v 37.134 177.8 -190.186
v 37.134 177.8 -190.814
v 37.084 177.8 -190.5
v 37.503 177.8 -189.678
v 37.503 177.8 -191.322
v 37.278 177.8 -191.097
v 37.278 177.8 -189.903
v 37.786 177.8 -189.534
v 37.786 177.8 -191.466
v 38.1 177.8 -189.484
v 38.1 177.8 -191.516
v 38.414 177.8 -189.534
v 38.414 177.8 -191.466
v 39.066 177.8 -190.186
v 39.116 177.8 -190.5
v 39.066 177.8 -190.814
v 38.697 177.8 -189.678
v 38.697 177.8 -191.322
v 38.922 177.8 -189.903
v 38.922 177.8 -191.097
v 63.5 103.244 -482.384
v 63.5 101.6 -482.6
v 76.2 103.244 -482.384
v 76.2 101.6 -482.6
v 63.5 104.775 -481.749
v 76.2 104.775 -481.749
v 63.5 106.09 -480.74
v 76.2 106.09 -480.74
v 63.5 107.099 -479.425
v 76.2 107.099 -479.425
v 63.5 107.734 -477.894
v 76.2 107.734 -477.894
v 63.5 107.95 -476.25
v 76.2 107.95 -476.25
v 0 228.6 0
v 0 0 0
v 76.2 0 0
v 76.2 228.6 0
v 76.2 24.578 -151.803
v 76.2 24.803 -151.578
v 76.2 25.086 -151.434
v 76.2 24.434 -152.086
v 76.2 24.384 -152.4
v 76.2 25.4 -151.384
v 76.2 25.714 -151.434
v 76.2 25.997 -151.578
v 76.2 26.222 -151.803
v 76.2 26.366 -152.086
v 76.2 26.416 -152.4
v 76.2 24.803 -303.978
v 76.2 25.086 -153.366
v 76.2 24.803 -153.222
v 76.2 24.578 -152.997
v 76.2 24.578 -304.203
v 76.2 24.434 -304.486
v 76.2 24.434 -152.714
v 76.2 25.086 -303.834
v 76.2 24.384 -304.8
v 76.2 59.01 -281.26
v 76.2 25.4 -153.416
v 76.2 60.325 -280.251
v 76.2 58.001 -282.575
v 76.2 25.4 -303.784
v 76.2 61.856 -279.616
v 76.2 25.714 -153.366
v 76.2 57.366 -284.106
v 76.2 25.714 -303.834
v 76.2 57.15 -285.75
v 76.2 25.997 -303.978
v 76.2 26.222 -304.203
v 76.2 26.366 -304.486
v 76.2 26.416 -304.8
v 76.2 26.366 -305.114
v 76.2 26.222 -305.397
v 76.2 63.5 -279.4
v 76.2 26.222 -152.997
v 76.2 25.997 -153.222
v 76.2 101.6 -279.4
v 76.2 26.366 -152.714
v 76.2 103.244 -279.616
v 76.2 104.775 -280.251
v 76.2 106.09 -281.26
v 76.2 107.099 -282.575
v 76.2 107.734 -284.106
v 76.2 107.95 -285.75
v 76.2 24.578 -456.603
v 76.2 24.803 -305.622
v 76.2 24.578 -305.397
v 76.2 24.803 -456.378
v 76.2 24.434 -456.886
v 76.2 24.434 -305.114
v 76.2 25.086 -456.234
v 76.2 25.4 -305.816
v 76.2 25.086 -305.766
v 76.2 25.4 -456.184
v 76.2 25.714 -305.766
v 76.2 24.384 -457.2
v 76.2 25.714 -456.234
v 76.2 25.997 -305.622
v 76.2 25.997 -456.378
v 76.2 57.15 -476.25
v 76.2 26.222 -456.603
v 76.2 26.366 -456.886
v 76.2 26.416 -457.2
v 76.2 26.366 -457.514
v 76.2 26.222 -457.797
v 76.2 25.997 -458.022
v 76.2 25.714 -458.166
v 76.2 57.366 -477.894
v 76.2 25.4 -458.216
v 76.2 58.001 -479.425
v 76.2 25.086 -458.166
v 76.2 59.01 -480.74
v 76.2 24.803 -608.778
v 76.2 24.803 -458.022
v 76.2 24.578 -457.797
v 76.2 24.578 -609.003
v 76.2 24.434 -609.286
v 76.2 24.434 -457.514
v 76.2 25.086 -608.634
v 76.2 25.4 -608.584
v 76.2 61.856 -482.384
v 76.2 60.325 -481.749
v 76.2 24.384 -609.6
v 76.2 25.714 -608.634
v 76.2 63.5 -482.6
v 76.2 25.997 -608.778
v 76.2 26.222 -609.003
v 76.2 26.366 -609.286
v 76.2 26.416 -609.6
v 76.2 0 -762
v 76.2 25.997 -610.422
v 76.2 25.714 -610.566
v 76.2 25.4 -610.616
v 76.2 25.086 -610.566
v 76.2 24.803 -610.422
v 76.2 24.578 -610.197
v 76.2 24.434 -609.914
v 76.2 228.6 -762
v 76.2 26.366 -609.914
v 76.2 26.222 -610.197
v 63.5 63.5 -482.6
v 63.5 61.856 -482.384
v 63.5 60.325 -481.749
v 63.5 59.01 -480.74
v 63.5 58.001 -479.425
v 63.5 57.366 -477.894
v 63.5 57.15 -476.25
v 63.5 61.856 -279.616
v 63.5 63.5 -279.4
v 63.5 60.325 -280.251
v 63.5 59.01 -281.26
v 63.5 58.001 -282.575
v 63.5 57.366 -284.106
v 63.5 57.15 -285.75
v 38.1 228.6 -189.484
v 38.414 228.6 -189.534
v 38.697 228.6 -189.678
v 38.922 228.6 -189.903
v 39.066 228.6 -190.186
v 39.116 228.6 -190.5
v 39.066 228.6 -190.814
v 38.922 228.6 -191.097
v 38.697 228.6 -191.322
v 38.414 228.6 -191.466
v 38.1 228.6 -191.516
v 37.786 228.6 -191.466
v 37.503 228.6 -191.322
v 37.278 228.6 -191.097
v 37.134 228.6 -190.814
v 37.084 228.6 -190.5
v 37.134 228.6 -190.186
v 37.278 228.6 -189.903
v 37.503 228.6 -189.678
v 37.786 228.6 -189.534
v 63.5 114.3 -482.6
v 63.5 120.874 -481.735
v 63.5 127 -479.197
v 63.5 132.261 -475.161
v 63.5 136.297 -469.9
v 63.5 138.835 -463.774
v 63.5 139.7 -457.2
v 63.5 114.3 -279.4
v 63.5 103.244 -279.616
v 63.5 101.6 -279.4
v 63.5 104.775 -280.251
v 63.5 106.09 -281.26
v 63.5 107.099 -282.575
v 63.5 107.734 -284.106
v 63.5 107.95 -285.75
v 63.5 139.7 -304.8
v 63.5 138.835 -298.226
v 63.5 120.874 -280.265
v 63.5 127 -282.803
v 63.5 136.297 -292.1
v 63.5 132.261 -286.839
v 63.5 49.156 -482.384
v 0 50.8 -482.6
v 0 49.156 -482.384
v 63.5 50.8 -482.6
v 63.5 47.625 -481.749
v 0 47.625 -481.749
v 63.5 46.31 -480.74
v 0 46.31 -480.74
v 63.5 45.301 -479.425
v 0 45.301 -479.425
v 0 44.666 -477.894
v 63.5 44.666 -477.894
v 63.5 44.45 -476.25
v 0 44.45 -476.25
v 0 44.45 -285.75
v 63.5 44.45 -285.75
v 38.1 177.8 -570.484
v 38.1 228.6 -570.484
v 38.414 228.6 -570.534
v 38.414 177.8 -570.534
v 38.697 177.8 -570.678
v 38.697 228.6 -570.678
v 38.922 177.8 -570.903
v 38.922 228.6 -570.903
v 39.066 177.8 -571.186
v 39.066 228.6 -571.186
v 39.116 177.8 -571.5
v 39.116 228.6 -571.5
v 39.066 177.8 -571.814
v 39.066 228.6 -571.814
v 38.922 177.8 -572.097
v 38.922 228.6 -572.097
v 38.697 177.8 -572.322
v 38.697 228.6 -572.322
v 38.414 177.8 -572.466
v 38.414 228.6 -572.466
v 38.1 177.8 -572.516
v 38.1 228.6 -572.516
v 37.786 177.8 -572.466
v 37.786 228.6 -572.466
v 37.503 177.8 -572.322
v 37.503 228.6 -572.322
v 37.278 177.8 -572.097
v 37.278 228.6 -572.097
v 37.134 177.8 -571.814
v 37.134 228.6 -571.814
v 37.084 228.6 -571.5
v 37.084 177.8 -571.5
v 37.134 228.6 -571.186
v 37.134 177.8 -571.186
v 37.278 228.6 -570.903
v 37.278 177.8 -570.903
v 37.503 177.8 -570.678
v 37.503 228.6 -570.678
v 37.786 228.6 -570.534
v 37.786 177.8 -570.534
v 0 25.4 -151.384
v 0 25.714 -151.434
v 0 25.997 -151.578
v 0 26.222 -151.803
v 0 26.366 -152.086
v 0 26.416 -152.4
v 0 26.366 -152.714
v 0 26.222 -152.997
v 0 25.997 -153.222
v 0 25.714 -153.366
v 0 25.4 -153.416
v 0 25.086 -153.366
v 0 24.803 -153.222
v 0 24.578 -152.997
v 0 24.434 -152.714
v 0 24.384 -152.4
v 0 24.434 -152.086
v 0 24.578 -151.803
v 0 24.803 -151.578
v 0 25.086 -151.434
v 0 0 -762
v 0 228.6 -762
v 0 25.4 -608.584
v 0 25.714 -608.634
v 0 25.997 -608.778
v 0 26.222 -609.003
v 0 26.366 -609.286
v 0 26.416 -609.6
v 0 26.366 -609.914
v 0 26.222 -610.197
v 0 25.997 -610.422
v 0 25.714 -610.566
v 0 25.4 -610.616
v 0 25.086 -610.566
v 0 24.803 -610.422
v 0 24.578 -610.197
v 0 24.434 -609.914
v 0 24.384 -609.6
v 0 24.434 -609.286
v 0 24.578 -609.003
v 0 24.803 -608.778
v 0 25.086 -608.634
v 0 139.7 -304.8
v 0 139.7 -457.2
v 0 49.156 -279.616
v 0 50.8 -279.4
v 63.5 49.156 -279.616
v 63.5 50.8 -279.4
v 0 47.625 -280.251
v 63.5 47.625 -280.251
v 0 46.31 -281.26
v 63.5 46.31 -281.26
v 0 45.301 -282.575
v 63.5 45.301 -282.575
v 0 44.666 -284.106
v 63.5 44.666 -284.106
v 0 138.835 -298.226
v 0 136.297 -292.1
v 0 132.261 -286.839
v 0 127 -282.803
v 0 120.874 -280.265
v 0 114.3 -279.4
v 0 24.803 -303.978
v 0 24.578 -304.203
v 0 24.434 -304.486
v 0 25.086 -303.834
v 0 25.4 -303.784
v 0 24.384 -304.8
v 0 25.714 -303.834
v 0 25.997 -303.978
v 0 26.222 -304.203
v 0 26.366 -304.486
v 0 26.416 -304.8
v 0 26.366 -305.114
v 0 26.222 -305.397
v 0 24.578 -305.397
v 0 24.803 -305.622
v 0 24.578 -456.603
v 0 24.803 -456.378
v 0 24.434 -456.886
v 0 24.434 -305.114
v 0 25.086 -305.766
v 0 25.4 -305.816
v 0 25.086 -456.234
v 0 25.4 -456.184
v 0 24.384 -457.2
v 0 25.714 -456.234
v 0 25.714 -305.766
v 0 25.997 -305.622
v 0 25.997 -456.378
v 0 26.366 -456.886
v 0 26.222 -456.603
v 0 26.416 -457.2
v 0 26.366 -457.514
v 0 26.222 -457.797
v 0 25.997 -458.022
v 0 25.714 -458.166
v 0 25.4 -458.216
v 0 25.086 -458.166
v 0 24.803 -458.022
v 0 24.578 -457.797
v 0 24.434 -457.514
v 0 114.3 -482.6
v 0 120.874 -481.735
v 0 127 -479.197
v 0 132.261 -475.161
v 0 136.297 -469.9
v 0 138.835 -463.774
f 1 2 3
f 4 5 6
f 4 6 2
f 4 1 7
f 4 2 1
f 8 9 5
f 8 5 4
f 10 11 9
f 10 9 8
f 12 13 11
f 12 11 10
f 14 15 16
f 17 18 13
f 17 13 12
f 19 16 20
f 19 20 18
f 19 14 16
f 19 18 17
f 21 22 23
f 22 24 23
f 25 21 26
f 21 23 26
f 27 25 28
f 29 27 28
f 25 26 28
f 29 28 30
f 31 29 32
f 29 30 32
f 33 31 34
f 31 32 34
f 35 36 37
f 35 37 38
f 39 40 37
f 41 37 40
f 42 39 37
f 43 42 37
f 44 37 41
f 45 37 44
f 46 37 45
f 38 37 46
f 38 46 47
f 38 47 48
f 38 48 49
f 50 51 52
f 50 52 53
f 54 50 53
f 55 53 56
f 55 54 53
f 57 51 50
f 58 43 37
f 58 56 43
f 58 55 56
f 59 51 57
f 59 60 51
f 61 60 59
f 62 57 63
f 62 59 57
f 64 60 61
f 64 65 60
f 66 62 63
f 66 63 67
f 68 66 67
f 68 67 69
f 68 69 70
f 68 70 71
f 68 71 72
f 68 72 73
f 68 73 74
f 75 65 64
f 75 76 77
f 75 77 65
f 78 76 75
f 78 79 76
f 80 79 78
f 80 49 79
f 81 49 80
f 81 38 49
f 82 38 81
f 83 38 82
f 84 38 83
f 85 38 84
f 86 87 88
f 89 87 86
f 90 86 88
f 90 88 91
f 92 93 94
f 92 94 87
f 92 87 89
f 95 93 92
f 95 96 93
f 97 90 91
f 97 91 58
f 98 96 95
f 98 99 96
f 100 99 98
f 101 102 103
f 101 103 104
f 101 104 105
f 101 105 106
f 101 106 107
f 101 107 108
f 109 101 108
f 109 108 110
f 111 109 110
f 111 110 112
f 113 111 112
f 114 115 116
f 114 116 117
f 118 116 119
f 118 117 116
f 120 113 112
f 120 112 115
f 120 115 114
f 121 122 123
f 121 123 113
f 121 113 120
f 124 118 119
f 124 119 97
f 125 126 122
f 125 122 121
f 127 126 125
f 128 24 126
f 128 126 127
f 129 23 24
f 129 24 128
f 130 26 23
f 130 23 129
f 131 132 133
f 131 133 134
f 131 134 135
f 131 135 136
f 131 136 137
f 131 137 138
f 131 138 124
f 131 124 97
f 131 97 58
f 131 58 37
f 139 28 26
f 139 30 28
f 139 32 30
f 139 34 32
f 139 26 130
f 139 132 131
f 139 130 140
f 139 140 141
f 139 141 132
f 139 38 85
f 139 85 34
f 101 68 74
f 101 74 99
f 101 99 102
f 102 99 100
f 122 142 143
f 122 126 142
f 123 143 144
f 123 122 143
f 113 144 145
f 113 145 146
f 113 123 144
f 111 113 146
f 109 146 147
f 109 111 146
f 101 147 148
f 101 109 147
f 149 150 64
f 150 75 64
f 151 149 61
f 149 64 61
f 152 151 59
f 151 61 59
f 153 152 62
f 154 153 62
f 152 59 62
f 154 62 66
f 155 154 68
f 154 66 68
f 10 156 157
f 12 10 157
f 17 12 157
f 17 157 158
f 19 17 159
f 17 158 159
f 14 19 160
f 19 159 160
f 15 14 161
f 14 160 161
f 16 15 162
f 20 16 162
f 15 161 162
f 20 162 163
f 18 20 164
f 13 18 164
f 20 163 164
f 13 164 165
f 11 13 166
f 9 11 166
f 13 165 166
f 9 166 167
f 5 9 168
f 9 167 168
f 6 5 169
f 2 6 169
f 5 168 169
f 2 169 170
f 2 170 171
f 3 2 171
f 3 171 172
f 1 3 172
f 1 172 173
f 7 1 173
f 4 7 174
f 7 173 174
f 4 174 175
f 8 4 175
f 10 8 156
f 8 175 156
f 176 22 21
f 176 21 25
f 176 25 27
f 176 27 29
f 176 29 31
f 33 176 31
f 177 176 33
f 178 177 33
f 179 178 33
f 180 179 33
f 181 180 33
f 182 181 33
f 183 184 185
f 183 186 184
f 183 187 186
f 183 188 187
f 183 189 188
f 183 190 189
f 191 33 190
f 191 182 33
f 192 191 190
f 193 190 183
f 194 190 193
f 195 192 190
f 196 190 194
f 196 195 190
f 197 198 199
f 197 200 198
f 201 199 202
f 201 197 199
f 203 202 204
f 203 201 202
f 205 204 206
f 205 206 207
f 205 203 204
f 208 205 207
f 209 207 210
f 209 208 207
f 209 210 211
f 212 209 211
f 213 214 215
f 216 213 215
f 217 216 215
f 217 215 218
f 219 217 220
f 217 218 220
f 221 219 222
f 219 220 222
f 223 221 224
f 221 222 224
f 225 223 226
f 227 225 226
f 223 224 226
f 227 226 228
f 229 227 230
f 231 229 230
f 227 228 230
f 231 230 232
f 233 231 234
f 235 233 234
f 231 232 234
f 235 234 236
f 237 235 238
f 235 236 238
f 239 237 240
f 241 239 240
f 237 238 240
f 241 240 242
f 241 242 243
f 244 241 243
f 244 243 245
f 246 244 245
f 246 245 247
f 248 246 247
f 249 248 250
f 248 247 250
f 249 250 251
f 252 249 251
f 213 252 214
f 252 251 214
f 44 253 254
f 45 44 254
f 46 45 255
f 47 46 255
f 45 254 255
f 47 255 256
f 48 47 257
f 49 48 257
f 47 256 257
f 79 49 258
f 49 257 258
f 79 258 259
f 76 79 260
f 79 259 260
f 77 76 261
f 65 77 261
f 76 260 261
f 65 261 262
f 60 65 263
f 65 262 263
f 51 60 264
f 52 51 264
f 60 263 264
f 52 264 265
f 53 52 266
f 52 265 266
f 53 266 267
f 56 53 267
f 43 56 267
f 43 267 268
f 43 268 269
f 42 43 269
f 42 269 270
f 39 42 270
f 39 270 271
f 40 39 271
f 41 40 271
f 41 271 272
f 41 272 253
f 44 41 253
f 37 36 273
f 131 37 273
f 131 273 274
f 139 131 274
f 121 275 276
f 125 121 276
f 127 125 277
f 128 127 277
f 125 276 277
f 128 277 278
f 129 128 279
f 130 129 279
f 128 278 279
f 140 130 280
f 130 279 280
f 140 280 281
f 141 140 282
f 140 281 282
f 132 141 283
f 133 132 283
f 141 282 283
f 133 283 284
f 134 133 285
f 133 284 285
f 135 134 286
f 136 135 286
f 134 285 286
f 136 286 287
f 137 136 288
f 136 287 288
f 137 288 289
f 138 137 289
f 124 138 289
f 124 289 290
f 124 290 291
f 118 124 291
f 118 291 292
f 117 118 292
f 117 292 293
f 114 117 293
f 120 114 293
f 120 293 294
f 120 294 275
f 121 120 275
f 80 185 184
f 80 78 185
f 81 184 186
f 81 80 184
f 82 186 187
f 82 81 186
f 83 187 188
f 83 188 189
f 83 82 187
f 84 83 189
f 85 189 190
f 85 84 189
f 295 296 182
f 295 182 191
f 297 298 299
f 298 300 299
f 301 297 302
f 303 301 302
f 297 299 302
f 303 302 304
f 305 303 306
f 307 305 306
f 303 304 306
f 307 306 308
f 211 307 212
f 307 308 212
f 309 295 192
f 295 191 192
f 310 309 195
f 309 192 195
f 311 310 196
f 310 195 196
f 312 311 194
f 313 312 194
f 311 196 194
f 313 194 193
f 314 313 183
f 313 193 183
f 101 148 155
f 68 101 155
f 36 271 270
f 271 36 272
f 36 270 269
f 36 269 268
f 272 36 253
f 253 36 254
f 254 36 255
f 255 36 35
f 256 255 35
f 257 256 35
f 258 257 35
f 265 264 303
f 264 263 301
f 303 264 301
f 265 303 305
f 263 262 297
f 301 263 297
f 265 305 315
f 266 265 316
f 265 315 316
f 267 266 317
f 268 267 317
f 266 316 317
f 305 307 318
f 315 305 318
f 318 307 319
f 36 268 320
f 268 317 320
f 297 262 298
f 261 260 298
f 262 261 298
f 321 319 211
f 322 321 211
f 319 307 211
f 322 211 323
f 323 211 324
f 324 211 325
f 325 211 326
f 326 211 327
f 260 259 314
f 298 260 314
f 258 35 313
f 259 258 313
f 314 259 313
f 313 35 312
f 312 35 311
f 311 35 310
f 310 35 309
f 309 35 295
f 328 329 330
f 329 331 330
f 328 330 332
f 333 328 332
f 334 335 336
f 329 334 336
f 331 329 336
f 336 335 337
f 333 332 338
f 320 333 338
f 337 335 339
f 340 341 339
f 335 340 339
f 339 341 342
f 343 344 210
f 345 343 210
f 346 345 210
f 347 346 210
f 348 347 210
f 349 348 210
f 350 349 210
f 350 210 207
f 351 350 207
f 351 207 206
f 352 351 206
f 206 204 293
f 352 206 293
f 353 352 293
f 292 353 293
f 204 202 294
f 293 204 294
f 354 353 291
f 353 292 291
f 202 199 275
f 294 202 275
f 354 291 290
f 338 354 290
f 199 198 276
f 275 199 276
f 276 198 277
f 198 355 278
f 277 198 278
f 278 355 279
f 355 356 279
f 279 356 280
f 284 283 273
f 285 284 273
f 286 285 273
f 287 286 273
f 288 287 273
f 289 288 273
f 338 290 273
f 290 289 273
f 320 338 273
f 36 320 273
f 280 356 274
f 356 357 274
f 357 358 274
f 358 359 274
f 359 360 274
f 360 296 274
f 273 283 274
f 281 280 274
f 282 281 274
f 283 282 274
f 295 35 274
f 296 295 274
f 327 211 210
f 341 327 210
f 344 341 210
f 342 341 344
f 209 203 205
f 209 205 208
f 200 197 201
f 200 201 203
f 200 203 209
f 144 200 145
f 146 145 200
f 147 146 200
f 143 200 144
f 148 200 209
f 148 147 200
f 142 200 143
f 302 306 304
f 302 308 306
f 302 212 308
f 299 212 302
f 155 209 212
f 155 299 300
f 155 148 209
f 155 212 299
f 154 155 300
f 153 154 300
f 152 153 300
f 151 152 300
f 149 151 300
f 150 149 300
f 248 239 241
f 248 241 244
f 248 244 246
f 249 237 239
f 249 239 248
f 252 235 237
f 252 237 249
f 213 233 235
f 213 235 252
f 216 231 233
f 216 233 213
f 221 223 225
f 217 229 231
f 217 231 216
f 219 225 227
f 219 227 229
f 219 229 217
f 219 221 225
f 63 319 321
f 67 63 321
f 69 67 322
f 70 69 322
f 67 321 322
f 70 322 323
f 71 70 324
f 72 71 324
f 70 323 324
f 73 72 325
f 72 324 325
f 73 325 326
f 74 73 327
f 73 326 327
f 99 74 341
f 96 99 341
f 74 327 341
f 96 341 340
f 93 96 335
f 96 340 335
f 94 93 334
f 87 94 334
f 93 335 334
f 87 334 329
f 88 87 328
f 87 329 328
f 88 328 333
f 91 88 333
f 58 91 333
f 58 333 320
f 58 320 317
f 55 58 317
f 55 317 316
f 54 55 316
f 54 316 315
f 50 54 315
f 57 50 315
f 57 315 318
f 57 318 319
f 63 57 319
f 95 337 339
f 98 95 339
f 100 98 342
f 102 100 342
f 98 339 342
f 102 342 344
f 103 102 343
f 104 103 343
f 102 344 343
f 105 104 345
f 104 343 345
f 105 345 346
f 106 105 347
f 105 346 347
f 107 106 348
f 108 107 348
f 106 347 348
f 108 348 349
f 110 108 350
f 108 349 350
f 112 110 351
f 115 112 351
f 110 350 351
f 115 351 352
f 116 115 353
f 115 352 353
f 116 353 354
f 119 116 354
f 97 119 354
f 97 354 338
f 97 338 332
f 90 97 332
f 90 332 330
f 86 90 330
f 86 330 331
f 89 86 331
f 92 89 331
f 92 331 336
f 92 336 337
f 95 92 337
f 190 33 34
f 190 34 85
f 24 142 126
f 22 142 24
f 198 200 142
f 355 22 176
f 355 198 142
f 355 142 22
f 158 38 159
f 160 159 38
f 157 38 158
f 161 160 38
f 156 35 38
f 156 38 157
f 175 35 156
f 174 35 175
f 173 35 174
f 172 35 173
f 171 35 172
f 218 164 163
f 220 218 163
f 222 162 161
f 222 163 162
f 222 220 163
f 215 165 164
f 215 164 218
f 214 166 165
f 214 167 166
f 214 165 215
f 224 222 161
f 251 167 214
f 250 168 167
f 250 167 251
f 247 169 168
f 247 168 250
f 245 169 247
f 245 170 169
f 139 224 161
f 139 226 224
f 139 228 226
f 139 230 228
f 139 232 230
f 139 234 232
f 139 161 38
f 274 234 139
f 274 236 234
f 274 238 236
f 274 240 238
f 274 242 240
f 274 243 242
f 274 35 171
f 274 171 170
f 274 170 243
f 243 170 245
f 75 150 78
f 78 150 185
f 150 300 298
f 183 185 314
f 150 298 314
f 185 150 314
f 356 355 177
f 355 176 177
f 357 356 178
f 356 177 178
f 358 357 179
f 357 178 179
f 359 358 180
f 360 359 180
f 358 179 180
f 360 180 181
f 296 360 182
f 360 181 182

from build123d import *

# Parameters (mm, degrees)
SKETCH1_W           = 762
SKETCH1_H           = 228.6
BOSS_EXTRUDE1_DEPTH = 76.2
SKETCH2_W           = 203.2
SKETCH2_H           = 95.25
CUT_EXTRUDE1_DEPTH  = 63.5
SKETCH3_W           = 203.2
SKETCH3_H           = 50.8
CUT_EXTRUDE2_DEPTH  = 799.081581043
FILLET1_R           = 25.4
SKETCH4_R           = 1.016
CUT_EXTRUDE3_DEPTH  = 800.192342306
LPATTERN1_COUNT     = 4
LPATTERN1_PITCH     = 152.4
FILLET2_R           = 6.35
FILLET3_R           = 6.35
SKETCH6_R           = 1.016
CUT_EXTRUDE4_DEPTH  = 50.8


with BuildPart() as part:
    # Sketch1 → Boss-Extrude1 (new body)
    with BuildSketch(Plane(origin=(0, 0, 0), x_dir=(0, 0, -1), z_dir=(1, 0, 0))):
        with Locations((381, 114.3)):
            Rectangle(SKETCH1_W, SKETCH1_H)
    extrude(amount=BOSS_EXTRUDE1_DEPTH)

    # Sketch2 → Cut-Extrude1 (cut)
    with BuildSketch(Plane.ZY):
        with Locations((-381, 92.075)):
            Rectangle(SKETCH2_W, SKETCH2_H)
    extrude(amount=-CUT_EXTRUDE1_DEPTH, mode=Mode.SUBTRACT)

    # Sketch3 → Cut-Extrude2 (cut, through all)
    with BuildSketch(Plane.ZY.offset(-63.5)):
        with Locations((-381, 82.55)):
            Rectangle(SKETCH3_W, SKETCH3_H)
    extrude(amount=-CUT_EXTRUDE2_DEPTH, mode=Mode.SUBTRACT)

    # Fillet1
    fillet1_edges = [part.edges().sort_by_distance(p)[0] for p in [
        (31.75, 139.7, -482.6),
        (31.75, 139.7, -279.4),
    ]]
    fillet(fillet1_edges, radius=FILLET1_R)

    # Sketch4 → Cut-Extrude3 (cut, through all)
    with BuildSketch(Plane.ZY):
        with Locations((-609.6, 25.4)):
            Circle(SKETCH4_R)
    cut_extrude3 = extrude(amount=-CUT_EXTRUDE3_DEPTH, mode=Mode.SUBTRACT)

    # LPattern1: Cut-Extrude3 ×4
    with Locations(*[(0, 0, i * LPATTERN1_PITCH) for i in range(1, LPATTERN1_COUNT)]):
        add(cut_extrude3, mode=Mode.SUBTRACT)

    # Fillet2
    fillet2_edges = [part.edges().sort_by_distance(p)[0] for p in [
        (69.85, 57.15, -482.6),
        (69.85, 107.95, -482.6),
        (69.85, 107.95, -279.4),
        (69.85, 57.15, -279.4),
    ]]
    fillet(fillet2_edges, radius=FILLET2_R)

    # Fillet3
    fillet3_edges = [part.edges().sort_by_distance(p)[0] for p in [
        (31.75, 44.45, -482.6),
        (31.75, 44.45, -279.4),
    ]]
    fillet(fillet3_edges, radius=FILLET3_R)

    # Sketch6 → Cut-Extrude4 (cut)
    with BuildSketch(Plane(origin=(0, 228.6, 0), x_dir=(1, 0, 0), z_dir=(0, 1, 0))):
        with Locations(Location((38.1, 571.5, 0), (0, 0, 270))):
            Circle(SKETCH6_R)
        with Locations(Location((38.1, 190.5, 0), (0, 0, 270))):
            Circle(SKETCH6_R)
    extrude(amount=-CUT_EXTRUDE4_DEPTH, mode=Mode.SUBTRACT)


solid = part.part
